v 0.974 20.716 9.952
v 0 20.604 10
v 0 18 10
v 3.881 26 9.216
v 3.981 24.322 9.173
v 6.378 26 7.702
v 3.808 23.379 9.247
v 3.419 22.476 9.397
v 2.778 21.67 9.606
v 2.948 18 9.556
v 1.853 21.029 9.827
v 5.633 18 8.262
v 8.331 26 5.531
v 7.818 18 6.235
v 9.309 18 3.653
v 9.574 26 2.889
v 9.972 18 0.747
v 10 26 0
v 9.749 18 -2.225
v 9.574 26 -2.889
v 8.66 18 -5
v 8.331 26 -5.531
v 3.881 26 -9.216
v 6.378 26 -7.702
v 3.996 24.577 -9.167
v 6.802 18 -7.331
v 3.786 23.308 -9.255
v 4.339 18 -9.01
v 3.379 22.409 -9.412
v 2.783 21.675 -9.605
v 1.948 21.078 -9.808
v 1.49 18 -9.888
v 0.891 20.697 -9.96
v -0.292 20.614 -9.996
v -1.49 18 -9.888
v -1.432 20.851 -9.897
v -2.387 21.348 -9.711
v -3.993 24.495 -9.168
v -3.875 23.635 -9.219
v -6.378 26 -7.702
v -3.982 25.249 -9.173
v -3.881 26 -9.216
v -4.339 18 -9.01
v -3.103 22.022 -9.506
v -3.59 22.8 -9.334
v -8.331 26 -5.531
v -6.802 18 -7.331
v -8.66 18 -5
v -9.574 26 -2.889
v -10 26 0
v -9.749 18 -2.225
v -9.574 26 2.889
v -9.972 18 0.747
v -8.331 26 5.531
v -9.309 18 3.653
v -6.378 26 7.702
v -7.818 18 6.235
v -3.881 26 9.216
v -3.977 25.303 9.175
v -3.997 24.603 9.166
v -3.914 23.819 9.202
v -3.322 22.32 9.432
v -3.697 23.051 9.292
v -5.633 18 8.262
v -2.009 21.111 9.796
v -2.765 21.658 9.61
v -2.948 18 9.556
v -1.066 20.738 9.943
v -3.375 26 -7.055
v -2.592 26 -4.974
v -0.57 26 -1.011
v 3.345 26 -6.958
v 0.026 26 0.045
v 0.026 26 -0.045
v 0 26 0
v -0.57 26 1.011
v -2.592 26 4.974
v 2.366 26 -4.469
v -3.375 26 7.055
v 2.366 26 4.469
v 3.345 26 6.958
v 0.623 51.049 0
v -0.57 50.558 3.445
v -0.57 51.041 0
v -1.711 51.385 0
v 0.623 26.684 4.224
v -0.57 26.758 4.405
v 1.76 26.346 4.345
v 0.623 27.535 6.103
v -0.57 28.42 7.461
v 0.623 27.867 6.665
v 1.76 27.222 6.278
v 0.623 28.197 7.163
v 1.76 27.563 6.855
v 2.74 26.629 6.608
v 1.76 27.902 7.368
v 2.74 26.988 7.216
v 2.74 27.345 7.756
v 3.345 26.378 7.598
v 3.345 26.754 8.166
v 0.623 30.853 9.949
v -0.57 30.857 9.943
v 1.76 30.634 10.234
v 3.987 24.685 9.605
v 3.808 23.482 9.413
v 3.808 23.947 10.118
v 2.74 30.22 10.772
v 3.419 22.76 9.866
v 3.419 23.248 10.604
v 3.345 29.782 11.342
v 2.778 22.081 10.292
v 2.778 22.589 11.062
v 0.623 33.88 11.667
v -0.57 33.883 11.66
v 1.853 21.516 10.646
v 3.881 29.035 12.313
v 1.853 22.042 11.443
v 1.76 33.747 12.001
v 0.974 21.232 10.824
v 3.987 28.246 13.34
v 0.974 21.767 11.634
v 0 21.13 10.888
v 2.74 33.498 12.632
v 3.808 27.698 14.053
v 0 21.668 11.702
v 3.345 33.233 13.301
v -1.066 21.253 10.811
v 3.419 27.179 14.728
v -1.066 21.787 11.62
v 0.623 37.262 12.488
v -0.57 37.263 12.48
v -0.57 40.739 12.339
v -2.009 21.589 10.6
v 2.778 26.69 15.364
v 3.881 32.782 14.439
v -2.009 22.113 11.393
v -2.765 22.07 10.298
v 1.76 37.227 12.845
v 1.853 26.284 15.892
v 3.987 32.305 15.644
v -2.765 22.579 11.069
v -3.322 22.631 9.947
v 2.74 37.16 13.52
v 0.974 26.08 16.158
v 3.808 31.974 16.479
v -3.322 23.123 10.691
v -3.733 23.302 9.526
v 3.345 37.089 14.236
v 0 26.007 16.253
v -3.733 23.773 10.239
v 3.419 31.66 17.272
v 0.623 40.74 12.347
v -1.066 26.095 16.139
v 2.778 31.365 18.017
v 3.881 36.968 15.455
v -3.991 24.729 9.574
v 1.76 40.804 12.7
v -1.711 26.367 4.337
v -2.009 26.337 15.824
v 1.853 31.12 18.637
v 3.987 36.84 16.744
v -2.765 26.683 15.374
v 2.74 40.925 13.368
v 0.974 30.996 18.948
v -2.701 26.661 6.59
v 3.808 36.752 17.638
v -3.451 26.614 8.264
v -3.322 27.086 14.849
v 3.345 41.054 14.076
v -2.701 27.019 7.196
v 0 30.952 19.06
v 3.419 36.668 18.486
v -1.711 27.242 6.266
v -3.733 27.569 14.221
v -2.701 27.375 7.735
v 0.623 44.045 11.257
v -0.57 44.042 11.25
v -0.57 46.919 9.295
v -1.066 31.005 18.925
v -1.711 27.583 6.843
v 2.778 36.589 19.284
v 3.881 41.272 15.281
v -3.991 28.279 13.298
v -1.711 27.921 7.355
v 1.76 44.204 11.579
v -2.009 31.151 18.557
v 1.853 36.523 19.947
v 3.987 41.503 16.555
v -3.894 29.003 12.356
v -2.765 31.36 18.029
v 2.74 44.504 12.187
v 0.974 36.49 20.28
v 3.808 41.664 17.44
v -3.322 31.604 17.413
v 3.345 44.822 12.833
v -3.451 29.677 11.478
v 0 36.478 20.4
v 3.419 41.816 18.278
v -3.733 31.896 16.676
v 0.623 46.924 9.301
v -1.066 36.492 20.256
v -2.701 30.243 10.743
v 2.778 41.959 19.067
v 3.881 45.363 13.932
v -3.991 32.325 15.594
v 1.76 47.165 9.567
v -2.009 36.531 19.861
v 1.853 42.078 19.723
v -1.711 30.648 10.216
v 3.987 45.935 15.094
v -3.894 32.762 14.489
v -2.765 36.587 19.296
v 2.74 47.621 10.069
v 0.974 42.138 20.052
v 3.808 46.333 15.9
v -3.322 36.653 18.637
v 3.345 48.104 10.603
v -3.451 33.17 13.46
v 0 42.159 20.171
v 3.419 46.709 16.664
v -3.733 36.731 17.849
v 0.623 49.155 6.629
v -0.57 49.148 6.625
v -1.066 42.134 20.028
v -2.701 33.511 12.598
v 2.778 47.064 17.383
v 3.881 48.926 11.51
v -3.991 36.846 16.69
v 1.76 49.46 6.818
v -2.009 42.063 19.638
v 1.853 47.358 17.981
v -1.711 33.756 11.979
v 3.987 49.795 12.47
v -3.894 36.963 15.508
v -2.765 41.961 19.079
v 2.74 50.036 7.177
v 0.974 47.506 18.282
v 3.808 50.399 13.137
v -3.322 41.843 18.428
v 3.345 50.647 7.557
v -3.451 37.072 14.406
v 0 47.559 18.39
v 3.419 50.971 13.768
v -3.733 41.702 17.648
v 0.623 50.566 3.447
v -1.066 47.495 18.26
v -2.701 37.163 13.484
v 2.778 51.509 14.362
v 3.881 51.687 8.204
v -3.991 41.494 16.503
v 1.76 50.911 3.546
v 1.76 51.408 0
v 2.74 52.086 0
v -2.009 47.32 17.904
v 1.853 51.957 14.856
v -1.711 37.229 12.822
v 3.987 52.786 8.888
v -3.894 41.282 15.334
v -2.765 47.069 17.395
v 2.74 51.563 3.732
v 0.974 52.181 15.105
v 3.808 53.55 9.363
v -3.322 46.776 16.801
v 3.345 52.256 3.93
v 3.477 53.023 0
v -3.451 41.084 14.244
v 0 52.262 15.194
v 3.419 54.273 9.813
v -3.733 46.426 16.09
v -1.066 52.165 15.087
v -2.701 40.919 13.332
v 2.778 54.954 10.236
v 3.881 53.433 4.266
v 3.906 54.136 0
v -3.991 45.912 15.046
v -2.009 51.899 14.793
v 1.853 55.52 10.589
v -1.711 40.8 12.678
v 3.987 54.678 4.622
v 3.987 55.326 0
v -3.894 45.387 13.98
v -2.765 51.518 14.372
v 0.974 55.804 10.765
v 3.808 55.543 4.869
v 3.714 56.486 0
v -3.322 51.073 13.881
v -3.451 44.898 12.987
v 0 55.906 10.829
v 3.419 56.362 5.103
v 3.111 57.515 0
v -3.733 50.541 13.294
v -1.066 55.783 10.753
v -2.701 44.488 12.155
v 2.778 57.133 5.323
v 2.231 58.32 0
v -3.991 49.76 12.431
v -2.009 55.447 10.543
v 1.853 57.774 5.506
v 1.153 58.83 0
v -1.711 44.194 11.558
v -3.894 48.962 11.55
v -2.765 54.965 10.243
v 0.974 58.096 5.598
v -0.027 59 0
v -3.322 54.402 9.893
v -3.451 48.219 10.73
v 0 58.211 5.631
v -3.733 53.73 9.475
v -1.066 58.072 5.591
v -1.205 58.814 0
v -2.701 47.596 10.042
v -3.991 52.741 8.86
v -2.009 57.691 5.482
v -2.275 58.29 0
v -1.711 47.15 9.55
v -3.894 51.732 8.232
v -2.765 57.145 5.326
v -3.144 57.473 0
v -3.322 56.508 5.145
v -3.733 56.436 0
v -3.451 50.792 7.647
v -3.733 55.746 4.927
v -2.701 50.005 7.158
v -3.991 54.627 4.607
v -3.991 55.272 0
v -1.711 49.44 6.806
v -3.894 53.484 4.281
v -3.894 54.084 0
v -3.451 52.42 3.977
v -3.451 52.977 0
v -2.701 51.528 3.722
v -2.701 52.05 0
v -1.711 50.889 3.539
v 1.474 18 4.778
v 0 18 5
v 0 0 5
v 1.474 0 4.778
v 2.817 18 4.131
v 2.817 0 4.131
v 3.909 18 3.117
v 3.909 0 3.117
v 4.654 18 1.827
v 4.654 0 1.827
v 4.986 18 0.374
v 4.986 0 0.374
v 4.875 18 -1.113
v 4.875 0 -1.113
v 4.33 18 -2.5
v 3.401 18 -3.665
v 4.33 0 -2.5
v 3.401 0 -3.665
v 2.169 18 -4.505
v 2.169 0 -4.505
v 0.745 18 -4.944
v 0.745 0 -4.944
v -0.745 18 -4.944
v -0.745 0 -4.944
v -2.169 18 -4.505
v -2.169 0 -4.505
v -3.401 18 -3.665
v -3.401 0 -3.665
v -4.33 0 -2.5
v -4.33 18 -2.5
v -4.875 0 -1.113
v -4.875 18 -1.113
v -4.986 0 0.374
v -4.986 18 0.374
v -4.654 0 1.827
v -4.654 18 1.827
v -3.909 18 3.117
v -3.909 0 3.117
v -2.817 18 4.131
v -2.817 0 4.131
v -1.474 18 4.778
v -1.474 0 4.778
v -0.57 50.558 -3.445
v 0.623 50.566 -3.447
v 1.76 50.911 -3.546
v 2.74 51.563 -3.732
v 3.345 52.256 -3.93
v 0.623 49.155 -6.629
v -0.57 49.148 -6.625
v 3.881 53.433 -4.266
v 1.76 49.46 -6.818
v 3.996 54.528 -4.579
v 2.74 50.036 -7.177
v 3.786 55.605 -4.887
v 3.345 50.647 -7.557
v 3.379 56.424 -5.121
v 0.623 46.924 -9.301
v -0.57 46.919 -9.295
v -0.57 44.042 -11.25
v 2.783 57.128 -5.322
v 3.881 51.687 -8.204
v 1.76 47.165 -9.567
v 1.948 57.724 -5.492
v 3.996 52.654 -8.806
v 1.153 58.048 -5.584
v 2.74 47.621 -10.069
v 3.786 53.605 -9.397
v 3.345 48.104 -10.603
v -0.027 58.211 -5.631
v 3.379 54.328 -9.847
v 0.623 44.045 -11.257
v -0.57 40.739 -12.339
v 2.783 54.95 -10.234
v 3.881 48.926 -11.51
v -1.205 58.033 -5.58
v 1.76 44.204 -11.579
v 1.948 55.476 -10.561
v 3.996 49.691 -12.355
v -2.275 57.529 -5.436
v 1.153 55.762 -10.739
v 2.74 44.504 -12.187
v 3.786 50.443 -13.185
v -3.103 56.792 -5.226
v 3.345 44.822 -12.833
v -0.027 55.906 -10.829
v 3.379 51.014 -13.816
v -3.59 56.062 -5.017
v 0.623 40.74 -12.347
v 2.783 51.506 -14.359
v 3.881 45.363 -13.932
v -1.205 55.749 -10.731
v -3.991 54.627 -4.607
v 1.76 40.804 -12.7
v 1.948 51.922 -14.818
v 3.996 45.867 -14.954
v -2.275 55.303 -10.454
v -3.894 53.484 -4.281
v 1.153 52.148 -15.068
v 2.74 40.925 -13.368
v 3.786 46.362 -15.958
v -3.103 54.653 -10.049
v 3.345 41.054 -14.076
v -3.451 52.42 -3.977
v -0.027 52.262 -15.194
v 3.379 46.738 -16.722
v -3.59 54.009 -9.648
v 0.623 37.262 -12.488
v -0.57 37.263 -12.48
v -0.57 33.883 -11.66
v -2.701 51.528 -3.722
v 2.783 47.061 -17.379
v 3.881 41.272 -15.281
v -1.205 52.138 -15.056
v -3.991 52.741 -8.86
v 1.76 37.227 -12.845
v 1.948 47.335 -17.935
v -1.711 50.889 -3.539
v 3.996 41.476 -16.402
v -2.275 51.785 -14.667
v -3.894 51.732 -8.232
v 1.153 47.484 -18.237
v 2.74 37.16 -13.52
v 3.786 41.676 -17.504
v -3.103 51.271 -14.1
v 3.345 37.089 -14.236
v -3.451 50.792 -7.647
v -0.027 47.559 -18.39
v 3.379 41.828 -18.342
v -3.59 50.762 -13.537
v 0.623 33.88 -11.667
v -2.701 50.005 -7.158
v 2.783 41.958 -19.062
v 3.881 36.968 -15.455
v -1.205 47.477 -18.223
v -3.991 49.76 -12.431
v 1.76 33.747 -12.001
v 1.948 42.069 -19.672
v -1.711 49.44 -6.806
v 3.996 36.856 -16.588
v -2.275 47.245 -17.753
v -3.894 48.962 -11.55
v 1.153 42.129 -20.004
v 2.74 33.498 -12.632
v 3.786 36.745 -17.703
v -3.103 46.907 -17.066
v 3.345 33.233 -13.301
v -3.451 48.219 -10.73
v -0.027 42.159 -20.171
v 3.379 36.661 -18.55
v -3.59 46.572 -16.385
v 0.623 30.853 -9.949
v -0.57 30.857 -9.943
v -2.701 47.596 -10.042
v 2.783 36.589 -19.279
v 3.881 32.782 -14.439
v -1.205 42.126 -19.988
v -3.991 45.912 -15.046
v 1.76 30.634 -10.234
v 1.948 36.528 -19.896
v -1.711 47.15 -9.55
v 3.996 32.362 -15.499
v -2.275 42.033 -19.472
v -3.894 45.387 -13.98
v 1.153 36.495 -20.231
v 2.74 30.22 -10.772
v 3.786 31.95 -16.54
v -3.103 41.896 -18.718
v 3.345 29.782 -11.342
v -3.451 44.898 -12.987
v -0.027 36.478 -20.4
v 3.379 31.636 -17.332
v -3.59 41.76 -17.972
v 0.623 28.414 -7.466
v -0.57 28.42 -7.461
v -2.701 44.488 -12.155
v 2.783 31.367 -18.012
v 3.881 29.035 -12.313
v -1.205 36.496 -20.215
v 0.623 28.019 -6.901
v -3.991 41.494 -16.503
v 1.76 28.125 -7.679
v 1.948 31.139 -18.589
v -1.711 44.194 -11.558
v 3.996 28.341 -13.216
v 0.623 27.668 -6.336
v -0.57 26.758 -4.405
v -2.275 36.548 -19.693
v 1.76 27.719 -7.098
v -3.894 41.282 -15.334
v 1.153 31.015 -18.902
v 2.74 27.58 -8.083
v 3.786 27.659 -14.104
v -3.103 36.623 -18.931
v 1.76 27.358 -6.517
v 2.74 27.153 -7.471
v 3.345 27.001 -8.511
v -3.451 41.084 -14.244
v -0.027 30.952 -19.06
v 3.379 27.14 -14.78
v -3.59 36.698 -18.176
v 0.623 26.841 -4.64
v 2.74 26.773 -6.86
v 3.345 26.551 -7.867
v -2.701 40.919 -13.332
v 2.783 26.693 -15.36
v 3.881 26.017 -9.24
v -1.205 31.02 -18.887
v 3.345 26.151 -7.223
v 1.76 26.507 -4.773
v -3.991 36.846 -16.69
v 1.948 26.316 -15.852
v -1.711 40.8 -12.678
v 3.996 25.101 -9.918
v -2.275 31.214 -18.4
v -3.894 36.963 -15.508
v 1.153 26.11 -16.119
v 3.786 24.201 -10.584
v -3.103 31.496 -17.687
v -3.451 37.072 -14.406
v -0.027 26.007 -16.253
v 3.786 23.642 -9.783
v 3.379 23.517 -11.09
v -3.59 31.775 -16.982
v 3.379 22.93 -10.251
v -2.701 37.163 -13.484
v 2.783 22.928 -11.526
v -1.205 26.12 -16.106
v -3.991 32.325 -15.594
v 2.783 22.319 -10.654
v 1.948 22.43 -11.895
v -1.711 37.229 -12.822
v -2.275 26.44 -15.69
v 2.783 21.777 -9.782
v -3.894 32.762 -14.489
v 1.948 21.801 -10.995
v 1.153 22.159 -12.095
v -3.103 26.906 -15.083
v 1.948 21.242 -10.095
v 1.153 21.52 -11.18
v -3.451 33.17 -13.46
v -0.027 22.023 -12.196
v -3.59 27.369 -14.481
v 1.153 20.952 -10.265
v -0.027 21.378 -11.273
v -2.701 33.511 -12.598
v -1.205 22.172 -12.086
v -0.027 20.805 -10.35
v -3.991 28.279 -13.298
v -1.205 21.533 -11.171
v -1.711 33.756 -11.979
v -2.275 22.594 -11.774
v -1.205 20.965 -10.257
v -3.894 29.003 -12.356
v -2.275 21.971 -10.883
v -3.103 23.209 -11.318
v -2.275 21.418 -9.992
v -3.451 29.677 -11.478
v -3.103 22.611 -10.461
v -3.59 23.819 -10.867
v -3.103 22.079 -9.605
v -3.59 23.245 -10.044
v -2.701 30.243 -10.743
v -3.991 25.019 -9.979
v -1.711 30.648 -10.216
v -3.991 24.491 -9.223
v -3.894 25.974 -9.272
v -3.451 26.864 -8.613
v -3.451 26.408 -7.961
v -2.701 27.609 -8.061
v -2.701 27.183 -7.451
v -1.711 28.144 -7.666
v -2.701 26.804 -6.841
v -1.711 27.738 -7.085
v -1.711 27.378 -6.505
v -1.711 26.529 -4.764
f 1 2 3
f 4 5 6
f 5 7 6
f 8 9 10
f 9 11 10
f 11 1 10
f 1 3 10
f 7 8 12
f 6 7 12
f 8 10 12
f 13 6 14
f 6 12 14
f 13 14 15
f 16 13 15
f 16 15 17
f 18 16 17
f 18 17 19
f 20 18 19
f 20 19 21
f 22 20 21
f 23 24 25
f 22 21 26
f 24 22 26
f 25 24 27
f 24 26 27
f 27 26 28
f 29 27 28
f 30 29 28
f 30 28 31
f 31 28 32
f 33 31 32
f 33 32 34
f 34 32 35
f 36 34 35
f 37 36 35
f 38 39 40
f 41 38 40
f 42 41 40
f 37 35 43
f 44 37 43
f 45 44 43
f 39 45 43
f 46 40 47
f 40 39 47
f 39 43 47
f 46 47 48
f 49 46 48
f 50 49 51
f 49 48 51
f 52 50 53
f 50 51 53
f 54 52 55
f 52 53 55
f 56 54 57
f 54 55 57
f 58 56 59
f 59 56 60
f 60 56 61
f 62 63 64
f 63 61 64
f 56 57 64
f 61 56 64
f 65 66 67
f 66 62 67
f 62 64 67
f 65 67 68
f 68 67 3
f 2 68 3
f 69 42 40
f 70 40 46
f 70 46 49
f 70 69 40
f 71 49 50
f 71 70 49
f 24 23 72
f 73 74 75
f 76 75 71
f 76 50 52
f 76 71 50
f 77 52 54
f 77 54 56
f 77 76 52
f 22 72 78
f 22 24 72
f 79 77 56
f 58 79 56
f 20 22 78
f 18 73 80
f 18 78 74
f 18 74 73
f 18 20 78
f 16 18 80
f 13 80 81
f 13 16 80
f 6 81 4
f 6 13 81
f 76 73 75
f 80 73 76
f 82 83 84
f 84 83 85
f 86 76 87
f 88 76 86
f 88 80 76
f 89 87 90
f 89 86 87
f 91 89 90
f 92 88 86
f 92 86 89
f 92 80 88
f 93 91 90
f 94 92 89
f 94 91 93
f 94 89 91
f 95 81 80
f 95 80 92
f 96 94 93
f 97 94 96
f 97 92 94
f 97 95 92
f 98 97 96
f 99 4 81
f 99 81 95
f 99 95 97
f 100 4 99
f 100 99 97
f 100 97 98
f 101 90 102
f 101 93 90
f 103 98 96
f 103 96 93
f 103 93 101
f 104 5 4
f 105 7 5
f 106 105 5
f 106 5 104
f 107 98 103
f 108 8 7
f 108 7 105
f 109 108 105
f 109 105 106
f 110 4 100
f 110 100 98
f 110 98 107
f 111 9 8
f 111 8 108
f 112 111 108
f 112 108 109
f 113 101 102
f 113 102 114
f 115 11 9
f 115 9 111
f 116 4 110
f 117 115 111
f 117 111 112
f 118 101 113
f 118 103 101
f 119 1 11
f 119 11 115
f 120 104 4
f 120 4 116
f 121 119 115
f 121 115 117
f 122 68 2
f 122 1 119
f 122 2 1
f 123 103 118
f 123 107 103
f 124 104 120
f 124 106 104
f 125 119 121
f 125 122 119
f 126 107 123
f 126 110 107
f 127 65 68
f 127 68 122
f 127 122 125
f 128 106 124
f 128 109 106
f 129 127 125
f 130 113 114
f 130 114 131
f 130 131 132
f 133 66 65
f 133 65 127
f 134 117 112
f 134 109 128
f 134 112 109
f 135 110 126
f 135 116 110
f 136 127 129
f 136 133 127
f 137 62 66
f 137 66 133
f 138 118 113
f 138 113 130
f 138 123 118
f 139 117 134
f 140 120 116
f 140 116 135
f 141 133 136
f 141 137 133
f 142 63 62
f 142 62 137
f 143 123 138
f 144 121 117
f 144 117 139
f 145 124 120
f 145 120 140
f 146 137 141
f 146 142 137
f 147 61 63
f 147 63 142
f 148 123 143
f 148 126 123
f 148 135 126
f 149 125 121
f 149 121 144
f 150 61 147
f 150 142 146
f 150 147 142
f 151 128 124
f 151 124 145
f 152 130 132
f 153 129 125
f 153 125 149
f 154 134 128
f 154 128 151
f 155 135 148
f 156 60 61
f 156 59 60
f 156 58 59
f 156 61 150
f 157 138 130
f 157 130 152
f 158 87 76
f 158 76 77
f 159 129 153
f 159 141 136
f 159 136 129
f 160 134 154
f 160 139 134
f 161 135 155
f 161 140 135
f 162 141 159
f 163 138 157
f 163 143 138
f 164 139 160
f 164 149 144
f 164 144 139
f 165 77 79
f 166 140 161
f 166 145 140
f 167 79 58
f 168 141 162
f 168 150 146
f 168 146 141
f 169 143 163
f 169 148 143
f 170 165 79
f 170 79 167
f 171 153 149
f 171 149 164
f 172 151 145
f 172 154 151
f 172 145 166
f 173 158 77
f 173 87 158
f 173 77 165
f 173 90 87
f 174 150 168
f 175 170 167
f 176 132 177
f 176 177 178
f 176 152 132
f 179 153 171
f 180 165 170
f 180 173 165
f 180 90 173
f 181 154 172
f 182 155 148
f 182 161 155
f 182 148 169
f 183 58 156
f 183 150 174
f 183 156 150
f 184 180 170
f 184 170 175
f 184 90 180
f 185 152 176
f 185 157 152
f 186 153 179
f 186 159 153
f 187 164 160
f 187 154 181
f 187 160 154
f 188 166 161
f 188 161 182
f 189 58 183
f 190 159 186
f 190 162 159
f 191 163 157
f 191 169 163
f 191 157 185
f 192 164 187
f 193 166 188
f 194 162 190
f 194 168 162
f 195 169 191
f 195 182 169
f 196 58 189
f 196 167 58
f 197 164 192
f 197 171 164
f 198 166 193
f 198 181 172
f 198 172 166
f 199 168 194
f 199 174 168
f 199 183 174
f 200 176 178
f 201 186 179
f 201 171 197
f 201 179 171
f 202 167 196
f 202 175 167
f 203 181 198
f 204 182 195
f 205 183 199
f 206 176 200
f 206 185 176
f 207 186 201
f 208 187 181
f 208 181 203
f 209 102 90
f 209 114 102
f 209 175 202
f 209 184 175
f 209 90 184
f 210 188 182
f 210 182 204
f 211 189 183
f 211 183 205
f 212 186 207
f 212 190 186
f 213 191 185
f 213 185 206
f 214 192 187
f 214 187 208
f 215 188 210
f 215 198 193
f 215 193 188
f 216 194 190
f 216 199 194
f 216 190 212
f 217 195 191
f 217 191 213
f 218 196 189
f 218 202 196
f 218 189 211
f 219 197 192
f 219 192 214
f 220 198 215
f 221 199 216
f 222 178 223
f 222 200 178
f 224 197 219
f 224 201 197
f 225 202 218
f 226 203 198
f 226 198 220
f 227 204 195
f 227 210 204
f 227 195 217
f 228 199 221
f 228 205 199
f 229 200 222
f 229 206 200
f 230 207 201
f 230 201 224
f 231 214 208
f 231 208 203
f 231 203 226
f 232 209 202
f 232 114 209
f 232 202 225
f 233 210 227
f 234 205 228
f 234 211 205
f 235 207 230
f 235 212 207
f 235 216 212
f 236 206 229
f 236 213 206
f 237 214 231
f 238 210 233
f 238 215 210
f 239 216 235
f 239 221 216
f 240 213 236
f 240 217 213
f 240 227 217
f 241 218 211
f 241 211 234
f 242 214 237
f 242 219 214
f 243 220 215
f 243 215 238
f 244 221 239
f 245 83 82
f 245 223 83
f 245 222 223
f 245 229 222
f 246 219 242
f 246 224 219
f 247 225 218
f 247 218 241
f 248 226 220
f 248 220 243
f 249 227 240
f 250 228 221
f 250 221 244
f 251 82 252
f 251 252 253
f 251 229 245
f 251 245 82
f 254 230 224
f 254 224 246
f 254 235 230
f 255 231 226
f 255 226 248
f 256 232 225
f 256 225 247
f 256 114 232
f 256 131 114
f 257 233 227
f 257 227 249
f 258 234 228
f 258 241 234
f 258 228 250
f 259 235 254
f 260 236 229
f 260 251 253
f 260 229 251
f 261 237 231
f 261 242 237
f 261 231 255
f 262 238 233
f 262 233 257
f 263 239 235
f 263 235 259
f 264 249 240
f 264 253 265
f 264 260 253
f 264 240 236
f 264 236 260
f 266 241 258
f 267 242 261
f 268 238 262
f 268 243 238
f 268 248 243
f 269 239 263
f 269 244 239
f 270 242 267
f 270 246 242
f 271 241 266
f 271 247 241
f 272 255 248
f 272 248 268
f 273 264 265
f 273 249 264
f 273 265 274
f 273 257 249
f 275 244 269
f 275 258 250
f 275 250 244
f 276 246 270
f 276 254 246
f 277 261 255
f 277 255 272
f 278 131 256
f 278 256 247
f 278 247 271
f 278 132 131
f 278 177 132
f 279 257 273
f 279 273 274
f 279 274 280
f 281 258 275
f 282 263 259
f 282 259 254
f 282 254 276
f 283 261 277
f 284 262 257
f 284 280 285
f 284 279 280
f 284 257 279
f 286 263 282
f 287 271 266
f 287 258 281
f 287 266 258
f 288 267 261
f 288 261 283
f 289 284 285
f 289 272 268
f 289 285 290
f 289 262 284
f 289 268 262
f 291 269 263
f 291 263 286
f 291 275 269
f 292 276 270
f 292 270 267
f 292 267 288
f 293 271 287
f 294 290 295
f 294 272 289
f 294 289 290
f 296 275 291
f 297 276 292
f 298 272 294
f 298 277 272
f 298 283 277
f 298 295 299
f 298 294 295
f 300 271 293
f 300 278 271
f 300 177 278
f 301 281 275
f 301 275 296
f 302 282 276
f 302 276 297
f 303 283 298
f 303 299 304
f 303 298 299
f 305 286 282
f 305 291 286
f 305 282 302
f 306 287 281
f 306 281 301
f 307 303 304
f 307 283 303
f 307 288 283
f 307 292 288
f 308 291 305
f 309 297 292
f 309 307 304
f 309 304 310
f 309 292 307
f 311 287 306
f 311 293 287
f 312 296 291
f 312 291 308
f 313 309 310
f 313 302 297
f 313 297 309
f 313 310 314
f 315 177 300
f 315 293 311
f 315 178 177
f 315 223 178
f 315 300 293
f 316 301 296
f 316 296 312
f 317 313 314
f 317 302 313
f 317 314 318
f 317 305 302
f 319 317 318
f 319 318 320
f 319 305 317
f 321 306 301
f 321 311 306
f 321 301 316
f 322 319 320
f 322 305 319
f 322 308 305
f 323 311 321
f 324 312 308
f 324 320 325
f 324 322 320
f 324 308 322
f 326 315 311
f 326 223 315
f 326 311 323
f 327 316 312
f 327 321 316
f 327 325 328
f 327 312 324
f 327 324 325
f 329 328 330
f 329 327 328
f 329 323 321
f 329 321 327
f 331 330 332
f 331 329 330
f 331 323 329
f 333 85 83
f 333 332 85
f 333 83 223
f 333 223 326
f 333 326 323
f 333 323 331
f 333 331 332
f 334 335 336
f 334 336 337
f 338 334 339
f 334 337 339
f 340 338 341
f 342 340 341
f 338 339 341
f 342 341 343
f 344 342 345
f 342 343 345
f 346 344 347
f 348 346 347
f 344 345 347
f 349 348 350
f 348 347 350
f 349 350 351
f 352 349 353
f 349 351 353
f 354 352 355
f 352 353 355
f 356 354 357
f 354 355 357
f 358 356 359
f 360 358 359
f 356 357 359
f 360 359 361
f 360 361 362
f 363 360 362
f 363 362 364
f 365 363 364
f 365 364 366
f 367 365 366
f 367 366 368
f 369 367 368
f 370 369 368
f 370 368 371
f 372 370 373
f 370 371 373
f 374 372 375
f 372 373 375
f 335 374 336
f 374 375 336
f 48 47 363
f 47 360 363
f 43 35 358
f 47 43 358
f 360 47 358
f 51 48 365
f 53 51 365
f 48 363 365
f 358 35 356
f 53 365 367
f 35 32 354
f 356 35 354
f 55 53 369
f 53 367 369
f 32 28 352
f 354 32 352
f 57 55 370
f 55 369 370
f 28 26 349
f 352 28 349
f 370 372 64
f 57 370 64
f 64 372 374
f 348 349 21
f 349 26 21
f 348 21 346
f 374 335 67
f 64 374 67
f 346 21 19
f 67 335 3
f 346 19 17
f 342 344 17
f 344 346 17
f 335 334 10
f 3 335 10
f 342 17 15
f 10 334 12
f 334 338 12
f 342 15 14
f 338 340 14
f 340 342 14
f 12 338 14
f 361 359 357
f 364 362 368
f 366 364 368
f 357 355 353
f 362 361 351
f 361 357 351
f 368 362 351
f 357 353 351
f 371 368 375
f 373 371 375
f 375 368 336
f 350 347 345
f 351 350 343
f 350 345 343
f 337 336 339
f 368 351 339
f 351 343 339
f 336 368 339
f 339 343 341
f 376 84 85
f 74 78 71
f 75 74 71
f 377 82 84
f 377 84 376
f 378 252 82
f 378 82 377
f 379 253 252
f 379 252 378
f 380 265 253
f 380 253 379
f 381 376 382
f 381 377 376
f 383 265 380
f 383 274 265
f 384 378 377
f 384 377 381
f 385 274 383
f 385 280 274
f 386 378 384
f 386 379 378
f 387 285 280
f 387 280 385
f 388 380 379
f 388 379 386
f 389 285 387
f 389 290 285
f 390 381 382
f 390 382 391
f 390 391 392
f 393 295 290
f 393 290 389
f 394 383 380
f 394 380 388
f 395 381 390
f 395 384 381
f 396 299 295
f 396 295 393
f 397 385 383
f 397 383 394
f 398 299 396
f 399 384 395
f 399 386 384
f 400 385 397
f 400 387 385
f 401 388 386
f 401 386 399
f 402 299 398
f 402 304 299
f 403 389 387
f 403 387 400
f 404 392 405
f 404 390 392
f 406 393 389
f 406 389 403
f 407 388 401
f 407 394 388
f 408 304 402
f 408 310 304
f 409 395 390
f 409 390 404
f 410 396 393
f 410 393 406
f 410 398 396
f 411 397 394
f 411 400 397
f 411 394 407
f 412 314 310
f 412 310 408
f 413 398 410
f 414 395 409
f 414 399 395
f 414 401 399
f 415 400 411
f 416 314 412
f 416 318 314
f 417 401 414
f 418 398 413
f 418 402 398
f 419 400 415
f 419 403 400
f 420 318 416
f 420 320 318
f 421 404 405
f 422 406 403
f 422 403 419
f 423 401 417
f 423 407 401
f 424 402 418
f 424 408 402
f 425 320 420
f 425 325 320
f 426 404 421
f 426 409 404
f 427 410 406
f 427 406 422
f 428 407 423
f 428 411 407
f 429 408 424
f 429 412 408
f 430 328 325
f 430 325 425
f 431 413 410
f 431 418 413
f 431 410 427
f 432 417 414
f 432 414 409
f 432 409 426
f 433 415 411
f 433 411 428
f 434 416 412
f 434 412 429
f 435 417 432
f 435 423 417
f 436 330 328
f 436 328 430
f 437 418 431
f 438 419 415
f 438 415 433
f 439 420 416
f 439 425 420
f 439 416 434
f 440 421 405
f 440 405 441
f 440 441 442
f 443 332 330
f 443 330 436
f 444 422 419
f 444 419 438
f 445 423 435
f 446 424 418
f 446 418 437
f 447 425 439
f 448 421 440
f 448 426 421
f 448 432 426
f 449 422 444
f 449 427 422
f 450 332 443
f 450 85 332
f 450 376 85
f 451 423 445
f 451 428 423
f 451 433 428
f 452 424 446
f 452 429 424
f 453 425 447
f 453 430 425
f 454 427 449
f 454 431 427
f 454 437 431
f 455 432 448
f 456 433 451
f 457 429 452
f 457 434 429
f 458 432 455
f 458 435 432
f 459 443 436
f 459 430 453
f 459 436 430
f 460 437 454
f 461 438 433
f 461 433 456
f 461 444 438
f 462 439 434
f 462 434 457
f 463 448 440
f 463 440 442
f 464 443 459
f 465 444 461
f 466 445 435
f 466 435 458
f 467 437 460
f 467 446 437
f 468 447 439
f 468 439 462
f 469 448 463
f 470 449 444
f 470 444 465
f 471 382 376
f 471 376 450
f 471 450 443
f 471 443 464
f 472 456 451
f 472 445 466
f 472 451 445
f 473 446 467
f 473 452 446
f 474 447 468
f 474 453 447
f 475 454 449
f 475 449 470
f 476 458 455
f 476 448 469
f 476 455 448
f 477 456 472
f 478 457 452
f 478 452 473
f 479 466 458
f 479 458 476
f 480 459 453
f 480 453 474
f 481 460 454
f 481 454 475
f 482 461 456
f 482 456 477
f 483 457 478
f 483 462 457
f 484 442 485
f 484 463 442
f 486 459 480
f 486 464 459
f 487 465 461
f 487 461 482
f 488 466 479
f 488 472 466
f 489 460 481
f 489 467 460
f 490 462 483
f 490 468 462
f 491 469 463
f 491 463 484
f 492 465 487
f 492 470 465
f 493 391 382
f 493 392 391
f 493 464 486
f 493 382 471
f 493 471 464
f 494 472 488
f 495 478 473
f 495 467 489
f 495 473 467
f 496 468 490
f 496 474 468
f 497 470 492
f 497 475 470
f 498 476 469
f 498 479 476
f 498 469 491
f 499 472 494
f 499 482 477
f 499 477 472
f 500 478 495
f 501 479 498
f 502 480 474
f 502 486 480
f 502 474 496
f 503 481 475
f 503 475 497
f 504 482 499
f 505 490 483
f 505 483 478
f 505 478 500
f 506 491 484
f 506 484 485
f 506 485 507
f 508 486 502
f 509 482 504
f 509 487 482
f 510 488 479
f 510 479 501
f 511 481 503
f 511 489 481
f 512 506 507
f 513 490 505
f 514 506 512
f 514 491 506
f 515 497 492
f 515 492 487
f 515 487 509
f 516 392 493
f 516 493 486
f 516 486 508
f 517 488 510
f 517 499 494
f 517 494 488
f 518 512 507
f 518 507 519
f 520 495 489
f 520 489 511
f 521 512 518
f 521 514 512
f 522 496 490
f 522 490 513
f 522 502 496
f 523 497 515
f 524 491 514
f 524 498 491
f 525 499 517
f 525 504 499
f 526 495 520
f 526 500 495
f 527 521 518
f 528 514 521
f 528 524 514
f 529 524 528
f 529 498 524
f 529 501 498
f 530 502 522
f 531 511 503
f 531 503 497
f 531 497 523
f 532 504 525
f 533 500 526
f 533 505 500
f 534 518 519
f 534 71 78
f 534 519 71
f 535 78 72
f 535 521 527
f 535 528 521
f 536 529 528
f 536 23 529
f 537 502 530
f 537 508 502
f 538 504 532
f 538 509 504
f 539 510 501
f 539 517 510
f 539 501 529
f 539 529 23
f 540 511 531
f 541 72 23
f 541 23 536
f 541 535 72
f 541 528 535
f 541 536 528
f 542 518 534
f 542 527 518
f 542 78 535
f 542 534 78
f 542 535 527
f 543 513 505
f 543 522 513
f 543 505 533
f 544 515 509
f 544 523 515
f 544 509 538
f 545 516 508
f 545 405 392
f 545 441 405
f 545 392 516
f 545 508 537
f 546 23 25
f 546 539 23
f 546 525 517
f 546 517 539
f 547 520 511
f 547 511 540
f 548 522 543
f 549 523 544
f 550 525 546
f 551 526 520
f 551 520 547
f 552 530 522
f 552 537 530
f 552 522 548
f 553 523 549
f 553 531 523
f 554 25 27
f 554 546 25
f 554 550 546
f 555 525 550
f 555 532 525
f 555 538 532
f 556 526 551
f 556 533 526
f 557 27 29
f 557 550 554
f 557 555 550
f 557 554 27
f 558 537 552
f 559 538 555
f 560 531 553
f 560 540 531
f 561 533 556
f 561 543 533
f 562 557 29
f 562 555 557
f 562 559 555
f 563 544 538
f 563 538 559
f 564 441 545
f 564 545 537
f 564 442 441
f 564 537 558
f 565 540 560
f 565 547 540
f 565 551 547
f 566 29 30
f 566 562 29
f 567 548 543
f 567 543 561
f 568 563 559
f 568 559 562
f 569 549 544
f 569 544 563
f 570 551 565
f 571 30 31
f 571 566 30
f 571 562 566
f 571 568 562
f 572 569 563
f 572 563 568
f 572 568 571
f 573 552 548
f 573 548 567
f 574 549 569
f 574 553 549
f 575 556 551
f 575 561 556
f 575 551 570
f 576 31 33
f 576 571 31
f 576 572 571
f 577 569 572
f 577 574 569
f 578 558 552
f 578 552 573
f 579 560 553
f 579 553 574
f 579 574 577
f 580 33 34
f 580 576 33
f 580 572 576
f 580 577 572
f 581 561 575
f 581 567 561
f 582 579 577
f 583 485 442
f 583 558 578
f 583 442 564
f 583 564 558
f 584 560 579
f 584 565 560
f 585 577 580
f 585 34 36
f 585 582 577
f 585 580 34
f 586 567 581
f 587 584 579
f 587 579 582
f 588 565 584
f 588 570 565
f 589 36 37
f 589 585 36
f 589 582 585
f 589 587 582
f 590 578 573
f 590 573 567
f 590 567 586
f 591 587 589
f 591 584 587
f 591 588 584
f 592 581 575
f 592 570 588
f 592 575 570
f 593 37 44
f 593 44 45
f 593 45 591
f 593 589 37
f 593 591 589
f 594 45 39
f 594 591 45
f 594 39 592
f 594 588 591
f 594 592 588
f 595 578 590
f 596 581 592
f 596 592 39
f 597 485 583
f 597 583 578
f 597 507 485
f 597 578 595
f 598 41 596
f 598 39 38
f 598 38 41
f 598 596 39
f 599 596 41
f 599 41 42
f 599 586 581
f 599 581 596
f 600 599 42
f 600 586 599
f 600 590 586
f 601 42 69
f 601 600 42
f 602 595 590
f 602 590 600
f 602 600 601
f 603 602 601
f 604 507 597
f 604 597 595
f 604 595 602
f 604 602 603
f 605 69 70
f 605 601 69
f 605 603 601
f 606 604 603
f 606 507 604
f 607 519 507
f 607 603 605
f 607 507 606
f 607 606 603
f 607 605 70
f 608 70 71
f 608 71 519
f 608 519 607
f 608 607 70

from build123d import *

# Parameters (mm, degrees)
SKETCH_1_R      = 5
EXTRUDE_1_DEPTH = 18
SKETCH_2_R      = 10
EXTRUDE_2_DEPTH = 8
SKETCH_3D_1_R   = 4


with BuildPart() as part:
    # 草圖1 → 填料-伸長1 (new body)
    with BuildSketch(Plane(origin=(0, 0, 0), x_dir=(1, 0, 0), z_dir=(0, 1, 0))):
        with Locations(Location((0, 0, 0), (0, 0, 270))):
            Circle(SKETCH_1_R)
    extrude(amount=EXTRUDE_1_DEPTH)

    # 草圖2 → 填料-伸長2 (add)
    with BuildSketch(Plane(origin=(0, 18, 0), x_dir=(1, 0, 0), z_dir=(0, 1, 0))):
        with Locations(Location((0, 0, 0), (0, 0, 270))):
            Circle(SKETCH_2_R)
    extrude(amount=EXTRUDE_2_DEPTH)

    # Sketch 3D_1 → 旋轉1 (revolve)
    with BuildSketch(Plane(origin=(0, 0, 0), x_dir=(-0.14242880634815436, 0.98980504904867, 0), z_dir=(0, 0, -1)), mode=Mode.PRIVATE) as revolve_1_sk:
        with Locations((21.775711079, 3.13343374)):
            Circle(SKETCH_3D_1_R)
    revolve(revolve_1_sk.sketch.rotate(Axis((0, 38.5, 0), (-1, 0, 0)), 180), axis=Axis((0, 38.5, 0), (-1, 0, 0)))


solid = part.part
